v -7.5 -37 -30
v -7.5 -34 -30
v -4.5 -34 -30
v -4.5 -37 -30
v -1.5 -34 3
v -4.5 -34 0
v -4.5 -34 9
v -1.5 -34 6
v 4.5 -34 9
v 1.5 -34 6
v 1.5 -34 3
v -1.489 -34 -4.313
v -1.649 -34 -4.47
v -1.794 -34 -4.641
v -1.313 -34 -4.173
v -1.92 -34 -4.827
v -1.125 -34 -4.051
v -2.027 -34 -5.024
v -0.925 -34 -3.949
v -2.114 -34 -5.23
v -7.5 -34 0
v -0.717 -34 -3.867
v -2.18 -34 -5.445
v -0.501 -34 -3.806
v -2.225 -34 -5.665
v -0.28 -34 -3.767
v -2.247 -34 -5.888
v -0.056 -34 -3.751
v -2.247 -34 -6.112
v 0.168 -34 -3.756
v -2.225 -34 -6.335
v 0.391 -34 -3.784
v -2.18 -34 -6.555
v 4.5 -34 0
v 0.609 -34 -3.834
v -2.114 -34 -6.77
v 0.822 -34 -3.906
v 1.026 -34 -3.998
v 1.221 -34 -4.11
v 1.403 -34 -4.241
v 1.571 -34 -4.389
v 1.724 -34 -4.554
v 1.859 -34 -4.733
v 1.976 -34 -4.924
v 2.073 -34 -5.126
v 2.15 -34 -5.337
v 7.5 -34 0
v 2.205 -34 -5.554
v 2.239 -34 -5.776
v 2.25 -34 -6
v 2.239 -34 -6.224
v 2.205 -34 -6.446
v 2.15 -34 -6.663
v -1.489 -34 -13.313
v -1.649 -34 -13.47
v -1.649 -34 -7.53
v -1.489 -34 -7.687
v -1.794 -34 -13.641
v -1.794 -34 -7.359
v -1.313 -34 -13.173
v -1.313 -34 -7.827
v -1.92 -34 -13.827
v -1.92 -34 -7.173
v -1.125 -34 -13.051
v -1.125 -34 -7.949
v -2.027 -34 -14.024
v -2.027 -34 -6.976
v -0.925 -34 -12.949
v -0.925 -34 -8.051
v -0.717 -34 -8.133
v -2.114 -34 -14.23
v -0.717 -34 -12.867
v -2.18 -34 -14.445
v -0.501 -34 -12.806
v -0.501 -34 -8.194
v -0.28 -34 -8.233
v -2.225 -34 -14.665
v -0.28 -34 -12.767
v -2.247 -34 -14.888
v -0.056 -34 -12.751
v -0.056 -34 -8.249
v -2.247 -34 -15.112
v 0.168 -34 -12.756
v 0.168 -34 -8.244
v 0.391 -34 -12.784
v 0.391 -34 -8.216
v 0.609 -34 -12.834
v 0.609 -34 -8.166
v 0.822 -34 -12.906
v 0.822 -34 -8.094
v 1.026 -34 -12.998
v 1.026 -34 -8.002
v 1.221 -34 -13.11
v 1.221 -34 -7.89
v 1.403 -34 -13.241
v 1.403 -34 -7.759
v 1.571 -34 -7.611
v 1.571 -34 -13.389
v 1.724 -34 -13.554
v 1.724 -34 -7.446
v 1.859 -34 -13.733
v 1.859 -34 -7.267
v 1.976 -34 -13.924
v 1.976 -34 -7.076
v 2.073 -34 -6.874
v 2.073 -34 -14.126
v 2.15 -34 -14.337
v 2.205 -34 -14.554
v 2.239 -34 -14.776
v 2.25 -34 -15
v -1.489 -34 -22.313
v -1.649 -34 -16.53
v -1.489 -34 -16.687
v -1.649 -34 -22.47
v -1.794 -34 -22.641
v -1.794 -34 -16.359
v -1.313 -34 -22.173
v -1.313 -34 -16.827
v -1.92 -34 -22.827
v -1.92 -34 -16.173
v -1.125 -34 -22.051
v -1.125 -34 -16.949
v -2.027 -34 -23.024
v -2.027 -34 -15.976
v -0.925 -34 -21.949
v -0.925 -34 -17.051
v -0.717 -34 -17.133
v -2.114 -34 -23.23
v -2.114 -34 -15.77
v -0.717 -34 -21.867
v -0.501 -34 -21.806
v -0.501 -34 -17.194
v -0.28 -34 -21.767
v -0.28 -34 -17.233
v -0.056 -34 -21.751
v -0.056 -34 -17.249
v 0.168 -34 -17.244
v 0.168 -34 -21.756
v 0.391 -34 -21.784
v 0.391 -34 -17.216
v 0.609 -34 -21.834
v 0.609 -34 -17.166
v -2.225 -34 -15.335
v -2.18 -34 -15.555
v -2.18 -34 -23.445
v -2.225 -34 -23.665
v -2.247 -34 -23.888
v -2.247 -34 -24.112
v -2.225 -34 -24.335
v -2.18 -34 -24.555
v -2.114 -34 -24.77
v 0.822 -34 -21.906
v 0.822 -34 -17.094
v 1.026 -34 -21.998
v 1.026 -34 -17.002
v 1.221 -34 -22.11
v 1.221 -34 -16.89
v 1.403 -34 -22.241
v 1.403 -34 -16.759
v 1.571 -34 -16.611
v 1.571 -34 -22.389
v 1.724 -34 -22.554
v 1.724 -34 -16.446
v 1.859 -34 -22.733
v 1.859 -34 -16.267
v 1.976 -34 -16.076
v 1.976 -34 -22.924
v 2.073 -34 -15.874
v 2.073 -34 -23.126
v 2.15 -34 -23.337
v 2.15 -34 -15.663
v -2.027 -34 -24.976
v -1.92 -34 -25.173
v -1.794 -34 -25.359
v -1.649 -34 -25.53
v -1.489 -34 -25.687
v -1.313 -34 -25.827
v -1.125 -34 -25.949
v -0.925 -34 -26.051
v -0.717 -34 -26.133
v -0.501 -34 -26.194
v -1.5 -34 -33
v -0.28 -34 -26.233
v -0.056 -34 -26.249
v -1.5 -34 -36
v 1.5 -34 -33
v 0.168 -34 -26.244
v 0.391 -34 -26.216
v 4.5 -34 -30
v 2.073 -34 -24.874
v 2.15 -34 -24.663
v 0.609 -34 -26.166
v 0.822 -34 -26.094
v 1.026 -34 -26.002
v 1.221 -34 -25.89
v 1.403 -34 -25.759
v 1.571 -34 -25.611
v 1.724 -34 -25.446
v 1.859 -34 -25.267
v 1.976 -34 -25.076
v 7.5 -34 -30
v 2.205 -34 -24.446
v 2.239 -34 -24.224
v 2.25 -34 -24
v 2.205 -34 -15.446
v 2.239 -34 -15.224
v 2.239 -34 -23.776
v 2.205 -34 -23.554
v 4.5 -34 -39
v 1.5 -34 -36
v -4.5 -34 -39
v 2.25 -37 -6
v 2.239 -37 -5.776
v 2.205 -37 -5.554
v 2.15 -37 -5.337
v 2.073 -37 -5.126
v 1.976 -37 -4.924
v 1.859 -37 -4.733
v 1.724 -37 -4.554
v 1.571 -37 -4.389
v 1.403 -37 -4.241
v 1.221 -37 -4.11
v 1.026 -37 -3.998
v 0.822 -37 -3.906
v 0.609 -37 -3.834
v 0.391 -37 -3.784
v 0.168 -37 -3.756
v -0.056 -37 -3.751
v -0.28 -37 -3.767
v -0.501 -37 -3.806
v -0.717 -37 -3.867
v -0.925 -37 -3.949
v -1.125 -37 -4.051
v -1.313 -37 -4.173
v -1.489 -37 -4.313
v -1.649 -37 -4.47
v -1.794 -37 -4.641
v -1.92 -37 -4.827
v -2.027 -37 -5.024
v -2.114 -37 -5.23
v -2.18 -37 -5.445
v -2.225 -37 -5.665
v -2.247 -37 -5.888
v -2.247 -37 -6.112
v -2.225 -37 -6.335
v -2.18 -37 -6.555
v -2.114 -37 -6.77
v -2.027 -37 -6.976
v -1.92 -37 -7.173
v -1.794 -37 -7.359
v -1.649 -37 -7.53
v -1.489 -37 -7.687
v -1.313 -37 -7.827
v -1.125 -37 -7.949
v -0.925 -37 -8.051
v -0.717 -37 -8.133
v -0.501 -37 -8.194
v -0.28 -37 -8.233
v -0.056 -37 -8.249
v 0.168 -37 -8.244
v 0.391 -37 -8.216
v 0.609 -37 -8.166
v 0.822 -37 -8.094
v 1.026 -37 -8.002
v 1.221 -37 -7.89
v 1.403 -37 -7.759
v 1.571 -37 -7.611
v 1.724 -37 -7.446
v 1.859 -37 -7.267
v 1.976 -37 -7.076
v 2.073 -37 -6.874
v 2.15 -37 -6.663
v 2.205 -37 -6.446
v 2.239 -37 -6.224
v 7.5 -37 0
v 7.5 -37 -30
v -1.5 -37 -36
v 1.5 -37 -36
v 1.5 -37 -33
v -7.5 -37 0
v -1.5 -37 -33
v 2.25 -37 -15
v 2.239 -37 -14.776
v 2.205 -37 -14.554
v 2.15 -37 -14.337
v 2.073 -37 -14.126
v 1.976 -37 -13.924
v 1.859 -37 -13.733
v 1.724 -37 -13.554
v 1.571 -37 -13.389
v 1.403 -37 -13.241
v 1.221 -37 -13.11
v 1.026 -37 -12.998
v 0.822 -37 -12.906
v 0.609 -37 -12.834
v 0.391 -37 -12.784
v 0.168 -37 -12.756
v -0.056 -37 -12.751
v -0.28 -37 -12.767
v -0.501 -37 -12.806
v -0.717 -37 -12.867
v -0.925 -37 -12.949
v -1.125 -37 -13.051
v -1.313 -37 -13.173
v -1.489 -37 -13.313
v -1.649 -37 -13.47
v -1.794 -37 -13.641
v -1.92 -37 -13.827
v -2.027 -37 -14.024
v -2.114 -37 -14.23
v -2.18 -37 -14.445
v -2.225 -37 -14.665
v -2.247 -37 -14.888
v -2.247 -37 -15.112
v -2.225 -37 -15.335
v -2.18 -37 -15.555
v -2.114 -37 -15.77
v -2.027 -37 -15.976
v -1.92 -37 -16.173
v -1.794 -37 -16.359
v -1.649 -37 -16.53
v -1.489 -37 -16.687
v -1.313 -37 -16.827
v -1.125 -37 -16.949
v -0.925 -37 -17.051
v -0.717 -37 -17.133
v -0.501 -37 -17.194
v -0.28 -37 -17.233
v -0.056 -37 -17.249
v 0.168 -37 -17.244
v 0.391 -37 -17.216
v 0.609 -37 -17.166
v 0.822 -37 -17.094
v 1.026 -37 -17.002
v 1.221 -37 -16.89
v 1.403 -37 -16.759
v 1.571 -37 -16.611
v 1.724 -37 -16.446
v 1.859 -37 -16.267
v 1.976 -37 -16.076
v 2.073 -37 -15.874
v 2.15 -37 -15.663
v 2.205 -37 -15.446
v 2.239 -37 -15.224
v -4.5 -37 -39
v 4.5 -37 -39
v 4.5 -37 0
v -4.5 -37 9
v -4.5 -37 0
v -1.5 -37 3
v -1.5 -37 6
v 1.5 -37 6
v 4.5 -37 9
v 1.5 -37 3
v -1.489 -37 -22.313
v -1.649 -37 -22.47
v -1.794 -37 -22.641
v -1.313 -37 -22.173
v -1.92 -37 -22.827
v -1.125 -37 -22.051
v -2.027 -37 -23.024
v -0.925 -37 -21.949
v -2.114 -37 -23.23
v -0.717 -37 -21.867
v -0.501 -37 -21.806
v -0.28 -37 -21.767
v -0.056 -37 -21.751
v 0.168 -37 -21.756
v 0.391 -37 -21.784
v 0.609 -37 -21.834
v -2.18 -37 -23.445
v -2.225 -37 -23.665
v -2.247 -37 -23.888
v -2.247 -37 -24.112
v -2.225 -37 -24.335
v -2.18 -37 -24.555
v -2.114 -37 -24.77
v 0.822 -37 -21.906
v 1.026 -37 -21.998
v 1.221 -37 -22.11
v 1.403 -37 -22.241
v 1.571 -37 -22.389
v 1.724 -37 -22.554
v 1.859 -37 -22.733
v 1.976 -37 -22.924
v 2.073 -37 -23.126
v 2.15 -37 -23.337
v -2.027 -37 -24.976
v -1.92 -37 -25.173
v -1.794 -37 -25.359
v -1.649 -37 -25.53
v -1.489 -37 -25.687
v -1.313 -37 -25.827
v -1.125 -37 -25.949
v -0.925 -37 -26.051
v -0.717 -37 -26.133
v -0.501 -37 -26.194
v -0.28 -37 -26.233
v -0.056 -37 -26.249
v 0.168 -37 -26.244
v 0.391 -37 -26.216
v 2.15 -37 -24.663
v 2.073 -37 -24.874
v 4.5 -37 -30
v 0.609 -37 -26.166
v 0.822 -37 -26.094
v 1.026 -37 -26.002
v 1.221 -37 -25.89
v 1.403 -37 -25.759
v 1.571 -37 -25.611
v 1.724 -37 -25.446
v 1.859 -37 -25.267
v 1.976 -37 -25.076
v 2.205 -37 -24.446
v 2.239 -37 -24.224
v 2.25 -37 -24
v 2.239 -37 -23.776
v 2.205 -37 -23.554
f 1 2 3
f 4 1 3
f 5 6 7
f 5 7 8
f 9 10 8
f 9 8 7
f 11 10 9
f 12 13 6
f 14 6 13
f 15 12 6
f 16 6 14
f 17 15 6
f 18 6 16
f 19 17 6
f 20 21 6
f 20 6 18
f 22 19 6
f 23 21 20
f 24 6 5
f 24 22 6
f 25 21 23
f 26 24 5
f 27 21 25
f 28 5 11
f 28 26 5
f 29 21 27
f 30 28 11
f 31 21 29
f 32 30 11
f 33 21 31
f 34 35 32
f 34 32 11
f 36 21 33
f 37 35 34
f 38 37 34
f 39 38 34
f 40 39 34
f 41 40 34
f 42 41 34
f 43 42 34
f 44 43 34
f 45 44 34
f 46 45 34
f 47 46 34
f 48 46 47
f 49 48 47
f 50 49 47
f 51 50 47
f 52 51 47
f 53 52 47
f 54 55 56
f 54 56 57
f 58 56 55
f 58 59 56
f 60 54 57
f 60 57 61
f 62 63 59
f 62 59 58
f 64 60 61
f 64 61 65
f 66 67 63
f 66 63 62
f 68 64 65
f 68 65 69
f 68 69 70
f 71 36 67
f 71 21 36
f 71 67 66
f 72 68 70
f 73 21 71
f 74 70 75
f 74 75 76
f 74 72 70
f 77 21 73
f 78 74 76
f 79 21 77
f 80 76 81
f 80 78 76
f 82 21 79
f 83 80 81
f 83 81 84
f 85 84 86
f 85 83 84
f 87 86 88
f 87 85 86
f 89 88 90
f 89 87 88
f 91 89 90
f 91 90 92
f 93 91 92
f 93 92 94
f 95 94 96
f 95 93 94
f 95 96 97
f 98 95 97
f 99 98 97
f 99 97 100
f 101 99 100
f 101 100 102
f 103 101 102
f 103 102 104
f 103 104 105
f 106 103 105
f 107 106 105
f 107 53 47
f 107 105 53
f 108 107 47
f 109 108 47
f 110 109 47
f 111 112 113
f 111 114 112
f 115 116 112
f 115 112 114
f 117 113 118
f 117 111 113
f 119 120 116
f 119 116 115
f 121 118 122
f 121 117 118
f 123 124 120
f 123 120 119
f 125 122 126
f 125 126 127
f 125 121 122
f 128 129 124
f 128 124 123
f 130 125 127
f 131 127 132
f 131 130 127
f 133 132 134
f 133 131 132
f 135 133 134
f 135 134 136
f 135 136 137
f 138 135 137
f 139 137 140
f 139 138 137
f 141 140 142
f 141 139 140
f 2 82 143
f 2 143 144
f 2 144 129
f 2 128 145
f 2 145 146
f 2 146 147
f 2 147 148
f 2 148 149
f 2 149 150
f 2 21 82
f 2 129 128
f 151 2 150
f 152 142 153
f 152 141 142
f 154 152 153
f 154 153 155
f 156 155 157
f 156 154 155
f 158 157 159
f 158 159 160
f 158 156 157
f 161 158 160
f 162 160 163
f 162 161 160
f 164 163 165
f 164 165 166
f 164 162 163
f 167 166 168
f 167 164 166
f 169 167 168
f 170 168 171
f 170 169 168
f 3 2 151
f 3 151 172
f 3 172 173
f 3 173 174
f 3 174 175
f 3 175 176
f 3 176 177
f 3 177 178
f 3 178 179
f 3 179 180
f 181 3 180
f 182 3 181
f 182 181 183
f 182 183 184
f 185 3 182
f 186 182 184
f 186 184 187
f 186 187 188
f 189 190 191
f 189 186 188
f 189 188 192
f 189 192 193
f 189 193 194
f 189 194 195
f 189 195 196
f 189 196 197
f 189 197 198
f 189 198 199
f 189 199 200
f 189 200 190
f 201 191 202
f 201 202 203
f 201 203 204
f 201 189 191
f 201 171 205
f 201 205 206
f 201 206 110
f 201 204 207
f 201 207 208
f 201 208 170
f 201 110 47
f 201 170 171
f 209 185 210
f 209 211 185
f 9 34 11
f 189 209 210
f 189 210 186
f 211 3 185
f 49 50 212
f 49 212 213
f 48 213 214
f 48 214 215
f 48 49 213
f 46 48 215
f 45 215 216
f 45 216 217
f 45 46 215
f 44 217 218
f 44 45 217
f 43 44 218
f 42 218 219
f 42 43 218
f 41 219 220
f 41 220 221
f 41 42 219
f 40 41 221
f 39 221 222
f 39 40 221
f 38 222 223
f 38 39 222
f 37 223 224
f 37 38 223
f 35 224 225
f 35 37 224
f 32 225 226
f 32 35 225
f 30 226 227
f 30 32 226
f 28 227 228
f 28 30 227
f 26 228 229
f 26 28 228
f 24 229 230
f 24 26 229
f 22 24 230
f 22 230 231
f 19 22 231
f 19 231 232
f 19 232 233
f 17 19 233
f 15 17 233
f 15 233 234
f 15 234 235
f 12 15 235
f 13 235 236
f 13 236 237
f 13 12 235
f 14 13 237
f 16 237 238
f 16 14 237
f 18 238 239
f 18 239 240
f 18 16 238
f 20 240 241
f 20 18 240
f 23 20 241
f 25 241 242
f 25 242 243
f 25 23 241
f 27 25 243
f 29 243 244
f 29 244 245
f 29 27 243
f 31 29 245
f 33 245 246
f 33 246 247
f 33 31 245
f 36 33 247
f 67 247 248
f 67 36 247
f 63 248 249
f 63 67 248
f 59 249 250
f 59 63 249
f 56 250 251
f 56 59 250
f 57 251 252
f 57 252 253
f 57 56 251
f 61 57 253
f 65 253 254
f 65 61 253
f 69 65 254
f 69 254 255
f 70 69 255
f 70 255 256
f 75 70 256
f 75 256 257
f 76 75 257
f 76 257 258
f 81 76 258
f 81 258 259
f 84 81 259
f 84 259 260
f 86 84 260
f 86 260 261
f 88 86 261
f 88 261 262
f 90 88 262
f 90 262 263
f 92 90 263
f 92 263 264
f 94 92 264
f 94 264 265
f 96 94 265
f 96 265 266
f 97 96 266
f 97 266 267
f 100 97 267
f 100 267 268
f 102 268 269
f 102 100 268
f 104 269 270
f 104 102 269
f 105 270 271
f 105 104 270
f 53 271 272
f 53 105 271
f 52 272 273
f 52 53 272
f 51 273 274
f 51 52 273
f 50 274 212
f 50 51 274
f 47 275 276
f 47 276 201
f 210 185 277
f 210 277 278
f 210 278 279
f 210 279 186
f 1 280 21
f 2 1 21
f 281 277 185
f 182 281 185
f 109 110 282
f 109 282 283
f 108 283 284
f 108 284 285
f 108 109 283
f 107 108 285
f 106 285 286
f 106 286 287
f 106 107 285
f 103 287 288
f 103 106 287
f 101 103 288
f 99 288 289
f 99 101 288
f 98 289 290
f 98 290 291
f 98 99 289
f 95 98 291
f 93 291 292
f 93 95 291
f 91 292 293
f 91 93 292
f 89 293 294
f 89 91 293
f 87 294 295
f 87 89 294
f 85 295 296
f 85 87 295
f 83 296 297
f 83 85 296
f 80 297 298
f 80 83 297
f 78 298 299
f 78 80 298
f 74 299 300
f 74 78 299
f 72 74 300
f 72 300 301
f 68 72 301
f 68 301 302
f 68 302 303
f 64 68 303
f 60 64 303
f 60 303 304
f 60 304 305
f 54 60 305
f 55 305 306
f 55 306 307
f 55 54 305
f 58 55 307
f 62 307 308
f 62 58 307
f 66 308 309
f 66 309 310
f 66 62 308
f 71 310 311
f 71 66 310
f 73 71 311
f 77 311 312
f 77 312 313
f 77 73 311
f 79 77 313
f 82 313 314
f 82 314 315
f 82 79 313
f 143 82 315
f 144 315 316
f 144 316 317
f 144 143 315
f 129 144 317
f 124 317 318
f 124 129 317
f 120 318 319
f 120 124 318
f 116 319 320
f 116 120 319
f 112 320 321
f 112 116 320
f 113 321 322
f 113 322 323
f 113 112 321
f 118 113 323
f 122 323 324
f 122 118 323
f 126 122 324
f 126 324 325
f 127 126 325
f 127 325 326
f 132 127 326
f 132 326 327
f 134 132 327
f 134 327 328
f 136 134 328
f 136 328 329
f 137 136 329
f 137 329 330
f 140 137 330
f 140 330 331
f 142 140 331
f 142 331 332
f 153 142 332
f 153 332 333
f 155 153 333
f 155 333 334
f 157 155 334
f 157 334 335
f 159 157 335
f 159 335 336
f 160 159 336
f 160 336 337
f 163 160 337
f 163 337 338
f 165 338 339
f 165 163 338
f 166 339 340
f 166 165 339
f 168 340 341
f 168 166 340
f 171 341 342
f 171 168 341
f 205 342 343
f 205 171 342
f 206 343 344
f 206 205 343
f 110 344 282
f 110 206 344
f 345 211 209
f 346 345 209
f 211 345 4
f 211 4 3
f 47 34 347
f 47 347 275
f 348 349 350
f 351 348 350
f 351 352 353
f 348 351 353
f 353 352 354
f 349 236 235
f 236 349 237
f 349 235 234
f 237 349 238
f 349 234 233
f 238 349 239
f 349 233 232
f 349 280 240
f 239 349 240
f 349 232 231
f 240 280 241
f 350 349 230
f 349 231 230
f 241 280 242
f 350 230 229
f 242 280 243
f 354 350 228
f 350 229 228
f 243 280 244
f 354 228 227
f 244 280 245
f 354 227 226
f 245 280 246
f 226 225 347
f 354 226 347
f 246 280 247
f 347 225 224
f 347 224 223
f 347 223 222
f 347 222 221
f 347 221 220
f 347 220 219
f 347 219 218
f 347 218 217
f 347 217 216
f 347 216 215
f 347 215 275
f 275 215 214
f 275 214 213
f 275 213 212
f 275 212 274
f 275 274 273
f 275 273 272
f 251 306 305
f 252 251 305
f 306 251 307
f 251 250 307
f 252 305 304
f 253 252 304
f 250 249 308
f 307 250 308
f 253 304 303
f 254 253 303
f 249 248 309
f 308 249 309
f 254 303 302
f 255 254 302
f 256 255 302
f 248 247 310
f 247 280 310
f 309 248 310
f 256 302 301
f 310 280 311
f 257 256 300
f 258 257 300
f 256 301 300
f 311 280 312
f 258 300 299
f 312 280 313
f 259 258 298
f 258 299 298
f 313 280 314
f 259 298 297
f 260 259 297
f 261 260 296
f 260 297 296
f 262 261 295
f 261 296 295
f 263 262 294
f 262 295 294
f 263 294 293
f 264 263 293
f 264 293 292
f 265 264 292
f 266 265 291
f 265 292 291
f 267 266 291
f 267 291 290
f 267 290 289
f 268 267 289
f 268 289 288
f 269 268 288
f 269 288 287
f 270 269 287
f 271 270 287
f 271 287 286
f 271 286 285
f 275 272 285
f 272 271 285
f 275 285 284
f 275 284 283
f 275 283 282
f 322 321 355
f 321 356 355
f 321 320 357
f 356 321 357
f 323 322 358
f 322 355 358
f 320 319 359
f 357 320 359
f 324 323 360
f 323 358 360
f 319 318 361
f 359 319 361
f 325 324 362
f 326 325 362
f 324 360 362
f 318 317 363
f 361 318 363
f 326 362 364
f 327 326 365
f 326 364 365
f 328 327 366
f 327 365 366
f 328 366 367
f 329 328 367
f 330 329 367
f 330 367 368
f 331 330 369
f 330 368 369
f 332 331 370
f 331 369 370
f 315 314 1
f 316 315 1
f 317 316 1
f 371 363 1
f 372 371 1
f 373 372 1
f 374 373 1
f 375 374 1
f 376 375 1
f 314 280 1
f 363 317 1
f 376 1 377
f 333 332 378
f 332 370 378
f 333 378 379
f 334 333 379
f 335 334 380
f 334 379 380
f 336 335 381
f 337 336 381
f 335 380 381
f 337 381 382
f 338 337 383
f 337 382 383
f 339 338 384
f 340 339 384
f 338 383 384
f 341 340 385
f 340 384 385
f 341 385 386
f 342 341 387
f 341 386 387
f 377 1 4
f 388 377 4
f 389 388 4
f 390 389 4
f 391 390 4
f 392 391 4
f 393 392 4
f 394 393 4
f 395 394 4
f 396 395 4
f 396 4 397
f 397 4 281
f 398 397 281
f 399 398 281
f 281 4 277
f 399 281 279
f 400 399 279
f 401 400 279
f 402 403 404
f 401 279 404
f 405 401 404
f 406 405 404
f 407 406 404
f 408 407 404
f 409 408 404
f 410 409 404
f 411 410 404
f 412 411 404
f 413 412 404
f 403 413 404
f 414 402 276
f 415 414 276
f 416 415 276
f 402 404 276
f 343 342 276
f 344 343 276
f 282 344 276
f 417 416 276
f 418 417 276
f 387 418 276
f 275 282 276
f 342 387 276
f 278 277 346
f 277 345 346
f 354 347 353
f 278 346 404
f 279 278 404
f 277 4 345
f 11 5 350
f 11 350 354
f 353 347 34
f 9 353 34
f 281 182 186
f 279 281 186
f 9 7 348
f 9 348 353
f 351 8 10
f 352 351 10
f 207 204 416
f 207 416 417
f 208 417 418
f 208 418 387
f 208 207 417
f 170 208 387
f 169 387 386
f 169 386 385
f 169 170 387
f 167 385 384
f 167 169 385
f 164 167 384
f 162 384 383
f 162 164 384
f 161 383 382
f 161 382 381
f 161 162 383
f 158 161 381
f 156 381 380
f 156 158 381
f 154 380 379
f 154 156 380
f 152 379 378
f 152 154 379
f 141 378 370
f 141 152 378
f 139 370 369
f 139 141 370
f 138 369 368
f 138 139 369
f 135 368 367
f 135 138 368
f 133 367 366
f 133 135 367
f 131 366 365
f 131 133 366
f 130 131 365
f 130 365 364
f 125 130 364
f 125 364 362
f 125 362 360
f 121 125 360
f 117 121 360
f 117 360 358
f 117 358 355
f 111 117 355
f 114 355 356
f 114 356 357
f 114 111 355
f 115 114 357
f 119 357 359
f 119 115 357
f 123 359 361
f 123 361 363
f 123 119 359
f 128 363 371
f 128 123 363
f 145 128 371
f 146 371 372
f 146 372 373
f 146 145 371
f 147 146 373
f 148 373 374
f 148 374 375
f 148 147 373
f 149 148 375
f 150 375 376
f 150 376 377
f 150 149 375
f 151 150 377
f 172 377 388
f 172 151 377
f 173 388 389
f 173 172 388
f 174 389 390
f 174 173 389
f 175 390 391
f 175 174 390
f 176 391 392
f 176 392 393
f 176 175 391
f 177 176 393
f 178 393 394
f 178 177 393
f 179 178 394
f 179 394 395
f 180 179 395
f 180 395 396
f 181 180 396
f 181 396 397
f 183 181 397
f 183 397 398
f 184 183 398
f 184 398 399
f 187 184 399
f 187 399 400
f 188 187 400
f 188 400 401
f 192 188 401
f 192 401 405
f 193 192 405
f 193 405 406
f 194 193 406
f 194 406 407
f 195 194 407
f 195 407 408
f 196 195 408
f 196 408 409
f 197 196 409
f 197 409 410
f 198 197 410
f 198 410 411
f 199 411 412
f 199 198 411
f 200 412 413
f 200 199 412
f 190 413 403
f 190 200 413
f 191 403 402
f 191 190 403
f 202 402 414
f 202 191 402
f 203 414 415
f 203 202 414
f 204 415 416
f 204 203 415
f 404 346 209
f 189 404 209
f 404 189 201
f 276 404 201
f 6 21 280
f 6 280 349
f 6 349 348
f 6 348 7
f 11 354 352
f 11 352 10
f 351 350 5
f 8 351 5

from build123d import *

# Parameters (mm, degrees)
CYLINDER005_R          = 2.25
CYLINDER005_DEPTH      = 3
CYLINDER005_ROLL_ANGLE = 90
CYLINDER006_R          = 2.25
CYLINDER006_DEPTH      = 3
CYLINDER006_ROLL_ANGLE = 90
CYLINDER004_R          = 2.25
CYLINDER004_DEPTH      = 3
CYLINDER004_ROLL_ANGLE = 90
BOX011_W               = 15
BOX011_H               = 3
BOX011_DEPTH           = 30
BOX010_W               = 3
BOX010_H               = 3
BOX010_DEPTH           = 3
BOX009_W               = 9
BOX009_H               = 3
BOX009_DEPTH           = 9
BOX013_W               = 3
BOX013_H               = 3
BOX013_DEPTH           = 3
BOX012_W               = 9
BOX012_H               = 3
BOX012_DEPTH           = 9


with BuildPart() as cylinder005:
    # Cylinder005 → Cylinder005 (new body)
    with BuildSketch(Plane.XY):
        Circle(CYLINDER005_R)
    extrude(amount=CYLINDER005_DEPTH)


with BuildPart() as cylinder005_1:
    # Cylinder005 roll: moved
    add(cylinder005.part.rotate(Axis((0, 0, 0), (1, 0, 0)), CYLINDER005_ROLL_ANGLE))


with BuildPart() as cylinder005_2:
    # Cylinder005 placement: moved
    add(cylinder005_1.part.moved(Location((0, -63, -3))))


with BuildPart() as cylinder006:
    # Cylinder006 → Cylinder006 (new body)
    with BuildSketch(Plane.XY):
        Circle(CYLINDER006_R)
    extrude(amount=CYLINDER006_DEPTH)


with BuildPart() as cylinder006_1:
    # Cylinder006 roll: moved
    add(cylinder006.part.rotate(Axis((0, 0, 0), (1, 0, 0)), CYLINDER006_ROLL_ANGLE))


with BuildPart() as cylinder006_2:
    # Cylinder006 placement: moved
    add(cylinder006_1.part.moved(Location((0, -63, -21))))


with BuildPart() as cylinder004:
    # Cylinder004 → Cylinder004 (new body)
    with BuildSketch(Plane.XY):
        Circle(CYLINDER004_R)
    extrude(amount=CYLINDER004_DEPTH)


with BuildPart() as cylinder004_1:
    # Cylinder004 roll: moved
    add(cylinder004.part.rotate(Axis((0, 0, 0), (1, 0, 0)), CYLINDER004_ROLL_ANGLE))


with BuildPart() as cylinder004_2:
    # Cylinder004 placement: moved
    add(cylinder004_1.part.moved(Location((0, -63, -12))))


with BuildPart() as cube011:
    # Box011 → Box011 (new body)
    with BuildSketch(Plane(origin=(-7.5, -66, -27), x_dir=(1, 0, 0), z_dir=(0, 0, 1))):
        with Locations((7.5, 1.5)):
            Rectangle(BOX011_W, BOX011_H)
    extrude(amount=BOX011_DEPTH)


with BuildPart() as cube010:
    # Box010 → Box010 (new body)
    with BuildSketch(Plane(origin=(-1.5, -66, 6), x_dir=(1, 0, 0), z_dir=(0, 0, 1))):
        with Locations((1.5, 1.5)):
            Rectangle(BOX010_W, BOX010_H)
    extrude(amount=BOX010_DEPTH)


with BuildPart() as cut010:
    # Box009 → Box009 (new body)
    with BuildSketch(Plane(origin=(-4.5, -66, 3), x_dir=(1, 0, 0), z_dir=(0, 0, 1))):
        with Locations((4.5, 1.5)):
            Rectangle(BOX009_W, BOX009_H)
    extrude(amount=BOX009_DEPTH)

    # Cut010: cut Cube010
    add(cube010.part, mode=Mode.SUBTRACT)


with BuildPart() as cube013:
    # Box013 → Box013 (new body)
    with BuildSketch(Plane(origin=(-1.5, -66, 6), x_dir=(1, 0, 0), z_dir=(0, 0, 1))):
        with Locations((1.5, 1.5)):
            Rectangle(BOX013_W, BOX013_H)
    extrude(amount=BOX013_DEPTH)


with BuildPart() as pitchringconnector:
    # Box012 → Box012 (new body)
    with BuildSketch(Plane(origin=(-4.5, -66, 3), x_dir=(1, 0, 0), z_dir=(0, 0, 1))):
        with Locations((4.5, 1.5)):
            Rectangle(BOX012_W, BOX012_H)
    extrude(amount=BOX012_DEPTH)

    # Cut011: cut Cube013
    add(cube013.part, mode=Mode.SUBTRACT)


with BuildPart() as pitchringconnector_1:
    # Cut011 placement: moved
    add(pitchringconnector.part.moved(Location((0, 0, -39))))

    # Fusion: union Cube011, Cut010
    add(cube011.part)
    add(cut010.part)

    # Cut012: cut Cylinder004
    add(cylinder004_2.part, mode=Mode.SUBTRACT)

    # Cut013: cut Cylinder006
    add(cylinder006_2.part, mode=Mode.SUBTRACT)

    # Cut014: cut Cylinder005
    add(cylinder005_2.part, mode=Mode.SUBTRACT)


with BuildPart() as pitchringconnector_2:
    # Cut014 placement: moved
    add(pitchringconnector_1.part.moved(Location((0, 29, -3))))


solid = pitchringconnector_2.part
